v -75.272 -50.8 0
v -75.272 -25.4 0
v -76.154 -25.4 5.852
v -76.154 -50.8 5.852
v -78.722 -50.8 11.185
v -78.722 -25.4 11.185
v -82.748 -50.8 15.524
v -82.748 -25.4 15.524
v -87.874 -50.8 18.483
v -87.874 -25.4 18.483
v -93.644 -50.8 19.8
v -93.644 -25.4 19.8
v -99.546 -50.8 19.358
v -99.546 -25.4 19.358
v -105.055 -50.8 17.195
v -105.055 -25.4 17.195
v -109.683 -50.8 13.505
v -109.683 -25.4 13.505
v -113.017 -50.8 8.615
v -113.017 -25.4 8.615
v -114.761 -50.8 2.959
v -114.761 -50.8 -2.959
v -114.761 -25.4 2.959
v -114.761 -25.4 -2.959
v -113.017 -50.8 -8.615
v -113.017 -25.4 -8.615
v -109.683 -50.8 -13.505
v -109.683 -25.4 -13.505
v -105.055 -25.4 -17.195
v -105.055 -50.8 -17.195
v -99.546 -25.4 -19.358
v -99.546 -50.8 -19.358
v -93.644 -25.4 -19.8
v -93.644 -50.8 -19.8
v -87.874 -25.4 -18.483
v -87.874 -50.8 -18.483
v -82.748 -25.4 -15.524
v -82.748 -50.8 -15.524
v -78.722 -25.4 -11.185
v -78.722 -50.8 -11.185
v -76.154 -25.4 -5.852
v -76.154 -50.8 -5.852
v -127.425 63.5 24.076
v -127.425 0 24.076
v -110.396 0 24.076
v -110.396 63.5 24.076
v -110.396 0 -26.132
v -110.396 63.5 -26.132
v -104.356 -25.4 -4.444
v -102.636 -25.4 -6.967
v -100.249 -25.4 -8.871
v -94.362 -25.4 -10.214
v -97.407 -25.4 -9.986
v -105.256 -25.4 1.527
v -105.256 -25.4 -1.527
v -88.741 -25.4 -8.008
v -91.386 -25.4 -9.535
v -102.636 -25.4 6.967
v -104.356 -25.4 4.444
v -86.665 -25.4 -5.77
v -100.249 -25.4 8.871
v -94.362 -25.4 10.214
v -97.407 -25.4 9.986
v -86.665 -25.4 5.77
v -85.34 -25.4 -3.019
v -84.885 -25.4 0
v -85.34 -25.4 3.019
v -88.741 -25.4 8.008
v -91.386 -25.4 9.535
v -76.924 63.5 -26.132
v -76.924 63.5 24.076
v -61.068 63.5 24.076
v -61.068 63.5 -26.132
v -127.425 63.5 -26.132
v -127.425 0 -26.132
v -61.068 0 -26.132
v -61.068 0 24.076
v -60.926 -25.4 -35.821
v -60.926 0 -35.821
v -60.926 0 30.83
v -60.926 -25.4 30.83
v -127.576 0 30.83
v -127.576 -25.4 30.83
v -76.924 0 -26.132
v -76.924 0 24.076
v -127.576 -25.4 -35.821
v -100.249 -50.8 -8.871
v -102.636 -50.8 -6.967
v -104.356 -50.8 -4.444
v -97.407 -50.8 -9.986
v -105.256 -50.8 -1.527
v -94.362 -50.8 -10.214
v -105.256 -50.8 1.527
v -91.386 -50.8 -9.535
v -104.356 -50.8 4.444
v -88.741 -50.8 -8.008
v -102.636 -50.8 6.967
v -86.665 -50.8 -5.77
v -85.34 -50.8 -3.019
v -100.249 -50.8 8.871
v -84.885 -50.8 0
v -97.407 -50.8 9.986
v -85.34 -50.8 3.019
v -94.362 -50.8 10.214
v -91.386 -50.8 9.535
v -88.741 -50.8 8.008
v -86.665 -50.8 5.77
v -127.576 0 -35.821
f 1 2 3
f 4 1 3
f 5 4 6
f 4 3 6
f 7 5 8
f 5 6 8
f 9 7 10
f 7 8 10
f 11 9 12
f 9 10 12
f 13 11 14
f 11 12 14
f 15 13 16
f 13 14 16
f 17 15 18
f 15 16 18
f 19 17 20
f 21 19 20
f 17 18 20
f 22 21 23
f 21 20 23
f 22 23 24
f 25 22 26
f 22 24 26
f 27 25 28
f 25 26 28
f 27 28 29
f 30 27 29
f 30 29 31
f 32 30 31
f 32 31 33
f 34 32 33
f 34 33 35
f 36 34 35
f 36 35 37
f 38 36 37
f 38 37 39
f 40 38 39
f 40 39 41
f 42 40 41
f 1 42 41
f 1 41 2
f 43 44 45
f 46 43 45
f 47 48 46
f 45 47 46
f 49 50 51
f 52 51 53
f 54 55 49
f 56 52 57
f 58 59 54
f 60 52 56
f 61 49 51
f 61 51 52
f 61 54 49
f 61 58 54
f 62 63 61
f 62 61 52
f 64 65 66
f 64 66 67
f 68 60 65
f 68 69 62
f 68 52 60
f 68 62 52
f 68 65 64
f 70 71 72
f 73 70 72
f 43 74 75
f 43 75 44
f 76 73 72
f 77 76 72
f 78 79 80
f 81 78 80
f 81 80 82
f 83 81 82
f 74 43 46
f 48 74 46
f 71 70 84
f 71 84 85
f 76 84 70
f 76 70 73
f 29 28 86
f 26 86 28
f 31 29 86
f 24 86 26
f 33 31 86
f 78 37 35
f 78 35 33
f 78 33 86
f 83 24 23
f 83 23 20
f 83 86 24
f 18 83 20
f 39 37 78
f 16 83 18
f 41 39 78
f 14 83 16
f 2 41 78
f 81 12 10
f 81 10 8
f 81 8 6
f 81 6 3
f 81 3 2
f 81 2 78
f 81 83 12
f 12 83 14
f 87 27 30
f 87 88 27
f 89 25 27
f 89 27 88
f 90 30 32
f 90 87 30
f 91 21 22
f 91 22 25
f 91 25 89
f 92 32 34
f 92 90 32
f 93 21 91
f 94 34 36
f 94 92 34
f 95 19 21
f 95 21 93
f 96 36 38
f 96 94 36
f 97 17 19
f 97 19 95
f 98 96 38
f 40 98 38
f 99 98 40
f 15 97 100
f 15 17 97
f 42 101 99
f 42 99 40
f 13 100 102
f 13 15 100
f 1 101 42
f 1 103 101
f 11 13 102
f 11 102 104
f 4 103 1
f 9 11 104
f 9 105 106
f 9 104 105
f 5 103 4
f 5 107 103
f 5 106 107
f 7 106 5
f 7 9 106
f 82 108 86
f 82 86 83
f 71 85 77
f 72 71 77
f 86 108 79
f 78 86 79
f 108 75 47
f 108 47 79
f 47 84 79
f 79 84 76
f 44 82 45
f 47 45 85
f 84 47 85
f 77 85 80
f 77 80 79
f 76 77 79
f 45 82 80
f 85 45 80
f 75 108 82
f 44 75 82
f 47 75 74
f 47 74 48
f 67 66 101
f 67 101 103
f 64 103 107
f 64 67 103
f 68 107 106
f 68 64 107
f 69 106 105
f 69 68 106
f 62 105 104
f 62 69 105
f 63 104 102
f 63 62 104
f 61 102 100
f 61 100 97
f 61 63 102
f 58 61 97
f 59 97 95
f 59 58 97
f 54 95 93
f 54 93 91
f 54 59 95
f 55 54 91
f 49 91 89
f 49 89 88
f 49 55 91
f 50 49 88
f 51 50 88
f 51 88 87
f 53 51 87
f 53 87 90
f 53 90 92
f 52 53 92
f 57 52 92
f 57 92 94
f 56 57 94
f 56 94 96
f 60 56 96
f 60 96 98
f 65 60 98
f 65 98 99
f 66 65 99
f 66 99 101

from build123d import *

# Parameters (mm, degrees)
F0_W     = 33.3248
F0_H     = 66.650534
F1_DEPTH = 25.4
F2_W     = 17.029665
F2_H     = 50.208108
F2_W_2   = 15.855189
F3_DEPTH = 63.5
F4_R     = 19.855384
F4_R_2   = 10.242902
F5_DEPTH = 50.8


with BuildPart() as f1:
    # F0 (on Front) → F1 (new body)
    with BuildSketch(Plane.XZ):
        with Locations((-77.588384, -2.495724)):
            Rectangle(F0_W, F0_H)
        with Locations((-110.913184, -2.495724)):
            Rectangle(F0_W, F0_H)
    extrude(amount=F1_DEPTH)

    # F2 (on Front) → F3 (join)
    with BuildSketch(Plane.XZ):
        with Locations((-118.91045, -1.027652)):
            Rectangle(F2_W, F2_H)
        with Locations((-68.995954, -1.027652)):
            Rectangle(F2_W_2, F2_H)
    extrude(amount=-F3_DEPTH)

    # F4 (on Front) → F5 (join)
    with BuildSketch(Plane.XZ):
        with Locations((-95.127657, 0)):
            Circle(F4_R)
        with Locations((-95.127657, 0)):
            Circle(F4_R_2, mode=Mode.SUBTRACT)
    extrude(amount=F5_DEPTH)


solid = f1.part
